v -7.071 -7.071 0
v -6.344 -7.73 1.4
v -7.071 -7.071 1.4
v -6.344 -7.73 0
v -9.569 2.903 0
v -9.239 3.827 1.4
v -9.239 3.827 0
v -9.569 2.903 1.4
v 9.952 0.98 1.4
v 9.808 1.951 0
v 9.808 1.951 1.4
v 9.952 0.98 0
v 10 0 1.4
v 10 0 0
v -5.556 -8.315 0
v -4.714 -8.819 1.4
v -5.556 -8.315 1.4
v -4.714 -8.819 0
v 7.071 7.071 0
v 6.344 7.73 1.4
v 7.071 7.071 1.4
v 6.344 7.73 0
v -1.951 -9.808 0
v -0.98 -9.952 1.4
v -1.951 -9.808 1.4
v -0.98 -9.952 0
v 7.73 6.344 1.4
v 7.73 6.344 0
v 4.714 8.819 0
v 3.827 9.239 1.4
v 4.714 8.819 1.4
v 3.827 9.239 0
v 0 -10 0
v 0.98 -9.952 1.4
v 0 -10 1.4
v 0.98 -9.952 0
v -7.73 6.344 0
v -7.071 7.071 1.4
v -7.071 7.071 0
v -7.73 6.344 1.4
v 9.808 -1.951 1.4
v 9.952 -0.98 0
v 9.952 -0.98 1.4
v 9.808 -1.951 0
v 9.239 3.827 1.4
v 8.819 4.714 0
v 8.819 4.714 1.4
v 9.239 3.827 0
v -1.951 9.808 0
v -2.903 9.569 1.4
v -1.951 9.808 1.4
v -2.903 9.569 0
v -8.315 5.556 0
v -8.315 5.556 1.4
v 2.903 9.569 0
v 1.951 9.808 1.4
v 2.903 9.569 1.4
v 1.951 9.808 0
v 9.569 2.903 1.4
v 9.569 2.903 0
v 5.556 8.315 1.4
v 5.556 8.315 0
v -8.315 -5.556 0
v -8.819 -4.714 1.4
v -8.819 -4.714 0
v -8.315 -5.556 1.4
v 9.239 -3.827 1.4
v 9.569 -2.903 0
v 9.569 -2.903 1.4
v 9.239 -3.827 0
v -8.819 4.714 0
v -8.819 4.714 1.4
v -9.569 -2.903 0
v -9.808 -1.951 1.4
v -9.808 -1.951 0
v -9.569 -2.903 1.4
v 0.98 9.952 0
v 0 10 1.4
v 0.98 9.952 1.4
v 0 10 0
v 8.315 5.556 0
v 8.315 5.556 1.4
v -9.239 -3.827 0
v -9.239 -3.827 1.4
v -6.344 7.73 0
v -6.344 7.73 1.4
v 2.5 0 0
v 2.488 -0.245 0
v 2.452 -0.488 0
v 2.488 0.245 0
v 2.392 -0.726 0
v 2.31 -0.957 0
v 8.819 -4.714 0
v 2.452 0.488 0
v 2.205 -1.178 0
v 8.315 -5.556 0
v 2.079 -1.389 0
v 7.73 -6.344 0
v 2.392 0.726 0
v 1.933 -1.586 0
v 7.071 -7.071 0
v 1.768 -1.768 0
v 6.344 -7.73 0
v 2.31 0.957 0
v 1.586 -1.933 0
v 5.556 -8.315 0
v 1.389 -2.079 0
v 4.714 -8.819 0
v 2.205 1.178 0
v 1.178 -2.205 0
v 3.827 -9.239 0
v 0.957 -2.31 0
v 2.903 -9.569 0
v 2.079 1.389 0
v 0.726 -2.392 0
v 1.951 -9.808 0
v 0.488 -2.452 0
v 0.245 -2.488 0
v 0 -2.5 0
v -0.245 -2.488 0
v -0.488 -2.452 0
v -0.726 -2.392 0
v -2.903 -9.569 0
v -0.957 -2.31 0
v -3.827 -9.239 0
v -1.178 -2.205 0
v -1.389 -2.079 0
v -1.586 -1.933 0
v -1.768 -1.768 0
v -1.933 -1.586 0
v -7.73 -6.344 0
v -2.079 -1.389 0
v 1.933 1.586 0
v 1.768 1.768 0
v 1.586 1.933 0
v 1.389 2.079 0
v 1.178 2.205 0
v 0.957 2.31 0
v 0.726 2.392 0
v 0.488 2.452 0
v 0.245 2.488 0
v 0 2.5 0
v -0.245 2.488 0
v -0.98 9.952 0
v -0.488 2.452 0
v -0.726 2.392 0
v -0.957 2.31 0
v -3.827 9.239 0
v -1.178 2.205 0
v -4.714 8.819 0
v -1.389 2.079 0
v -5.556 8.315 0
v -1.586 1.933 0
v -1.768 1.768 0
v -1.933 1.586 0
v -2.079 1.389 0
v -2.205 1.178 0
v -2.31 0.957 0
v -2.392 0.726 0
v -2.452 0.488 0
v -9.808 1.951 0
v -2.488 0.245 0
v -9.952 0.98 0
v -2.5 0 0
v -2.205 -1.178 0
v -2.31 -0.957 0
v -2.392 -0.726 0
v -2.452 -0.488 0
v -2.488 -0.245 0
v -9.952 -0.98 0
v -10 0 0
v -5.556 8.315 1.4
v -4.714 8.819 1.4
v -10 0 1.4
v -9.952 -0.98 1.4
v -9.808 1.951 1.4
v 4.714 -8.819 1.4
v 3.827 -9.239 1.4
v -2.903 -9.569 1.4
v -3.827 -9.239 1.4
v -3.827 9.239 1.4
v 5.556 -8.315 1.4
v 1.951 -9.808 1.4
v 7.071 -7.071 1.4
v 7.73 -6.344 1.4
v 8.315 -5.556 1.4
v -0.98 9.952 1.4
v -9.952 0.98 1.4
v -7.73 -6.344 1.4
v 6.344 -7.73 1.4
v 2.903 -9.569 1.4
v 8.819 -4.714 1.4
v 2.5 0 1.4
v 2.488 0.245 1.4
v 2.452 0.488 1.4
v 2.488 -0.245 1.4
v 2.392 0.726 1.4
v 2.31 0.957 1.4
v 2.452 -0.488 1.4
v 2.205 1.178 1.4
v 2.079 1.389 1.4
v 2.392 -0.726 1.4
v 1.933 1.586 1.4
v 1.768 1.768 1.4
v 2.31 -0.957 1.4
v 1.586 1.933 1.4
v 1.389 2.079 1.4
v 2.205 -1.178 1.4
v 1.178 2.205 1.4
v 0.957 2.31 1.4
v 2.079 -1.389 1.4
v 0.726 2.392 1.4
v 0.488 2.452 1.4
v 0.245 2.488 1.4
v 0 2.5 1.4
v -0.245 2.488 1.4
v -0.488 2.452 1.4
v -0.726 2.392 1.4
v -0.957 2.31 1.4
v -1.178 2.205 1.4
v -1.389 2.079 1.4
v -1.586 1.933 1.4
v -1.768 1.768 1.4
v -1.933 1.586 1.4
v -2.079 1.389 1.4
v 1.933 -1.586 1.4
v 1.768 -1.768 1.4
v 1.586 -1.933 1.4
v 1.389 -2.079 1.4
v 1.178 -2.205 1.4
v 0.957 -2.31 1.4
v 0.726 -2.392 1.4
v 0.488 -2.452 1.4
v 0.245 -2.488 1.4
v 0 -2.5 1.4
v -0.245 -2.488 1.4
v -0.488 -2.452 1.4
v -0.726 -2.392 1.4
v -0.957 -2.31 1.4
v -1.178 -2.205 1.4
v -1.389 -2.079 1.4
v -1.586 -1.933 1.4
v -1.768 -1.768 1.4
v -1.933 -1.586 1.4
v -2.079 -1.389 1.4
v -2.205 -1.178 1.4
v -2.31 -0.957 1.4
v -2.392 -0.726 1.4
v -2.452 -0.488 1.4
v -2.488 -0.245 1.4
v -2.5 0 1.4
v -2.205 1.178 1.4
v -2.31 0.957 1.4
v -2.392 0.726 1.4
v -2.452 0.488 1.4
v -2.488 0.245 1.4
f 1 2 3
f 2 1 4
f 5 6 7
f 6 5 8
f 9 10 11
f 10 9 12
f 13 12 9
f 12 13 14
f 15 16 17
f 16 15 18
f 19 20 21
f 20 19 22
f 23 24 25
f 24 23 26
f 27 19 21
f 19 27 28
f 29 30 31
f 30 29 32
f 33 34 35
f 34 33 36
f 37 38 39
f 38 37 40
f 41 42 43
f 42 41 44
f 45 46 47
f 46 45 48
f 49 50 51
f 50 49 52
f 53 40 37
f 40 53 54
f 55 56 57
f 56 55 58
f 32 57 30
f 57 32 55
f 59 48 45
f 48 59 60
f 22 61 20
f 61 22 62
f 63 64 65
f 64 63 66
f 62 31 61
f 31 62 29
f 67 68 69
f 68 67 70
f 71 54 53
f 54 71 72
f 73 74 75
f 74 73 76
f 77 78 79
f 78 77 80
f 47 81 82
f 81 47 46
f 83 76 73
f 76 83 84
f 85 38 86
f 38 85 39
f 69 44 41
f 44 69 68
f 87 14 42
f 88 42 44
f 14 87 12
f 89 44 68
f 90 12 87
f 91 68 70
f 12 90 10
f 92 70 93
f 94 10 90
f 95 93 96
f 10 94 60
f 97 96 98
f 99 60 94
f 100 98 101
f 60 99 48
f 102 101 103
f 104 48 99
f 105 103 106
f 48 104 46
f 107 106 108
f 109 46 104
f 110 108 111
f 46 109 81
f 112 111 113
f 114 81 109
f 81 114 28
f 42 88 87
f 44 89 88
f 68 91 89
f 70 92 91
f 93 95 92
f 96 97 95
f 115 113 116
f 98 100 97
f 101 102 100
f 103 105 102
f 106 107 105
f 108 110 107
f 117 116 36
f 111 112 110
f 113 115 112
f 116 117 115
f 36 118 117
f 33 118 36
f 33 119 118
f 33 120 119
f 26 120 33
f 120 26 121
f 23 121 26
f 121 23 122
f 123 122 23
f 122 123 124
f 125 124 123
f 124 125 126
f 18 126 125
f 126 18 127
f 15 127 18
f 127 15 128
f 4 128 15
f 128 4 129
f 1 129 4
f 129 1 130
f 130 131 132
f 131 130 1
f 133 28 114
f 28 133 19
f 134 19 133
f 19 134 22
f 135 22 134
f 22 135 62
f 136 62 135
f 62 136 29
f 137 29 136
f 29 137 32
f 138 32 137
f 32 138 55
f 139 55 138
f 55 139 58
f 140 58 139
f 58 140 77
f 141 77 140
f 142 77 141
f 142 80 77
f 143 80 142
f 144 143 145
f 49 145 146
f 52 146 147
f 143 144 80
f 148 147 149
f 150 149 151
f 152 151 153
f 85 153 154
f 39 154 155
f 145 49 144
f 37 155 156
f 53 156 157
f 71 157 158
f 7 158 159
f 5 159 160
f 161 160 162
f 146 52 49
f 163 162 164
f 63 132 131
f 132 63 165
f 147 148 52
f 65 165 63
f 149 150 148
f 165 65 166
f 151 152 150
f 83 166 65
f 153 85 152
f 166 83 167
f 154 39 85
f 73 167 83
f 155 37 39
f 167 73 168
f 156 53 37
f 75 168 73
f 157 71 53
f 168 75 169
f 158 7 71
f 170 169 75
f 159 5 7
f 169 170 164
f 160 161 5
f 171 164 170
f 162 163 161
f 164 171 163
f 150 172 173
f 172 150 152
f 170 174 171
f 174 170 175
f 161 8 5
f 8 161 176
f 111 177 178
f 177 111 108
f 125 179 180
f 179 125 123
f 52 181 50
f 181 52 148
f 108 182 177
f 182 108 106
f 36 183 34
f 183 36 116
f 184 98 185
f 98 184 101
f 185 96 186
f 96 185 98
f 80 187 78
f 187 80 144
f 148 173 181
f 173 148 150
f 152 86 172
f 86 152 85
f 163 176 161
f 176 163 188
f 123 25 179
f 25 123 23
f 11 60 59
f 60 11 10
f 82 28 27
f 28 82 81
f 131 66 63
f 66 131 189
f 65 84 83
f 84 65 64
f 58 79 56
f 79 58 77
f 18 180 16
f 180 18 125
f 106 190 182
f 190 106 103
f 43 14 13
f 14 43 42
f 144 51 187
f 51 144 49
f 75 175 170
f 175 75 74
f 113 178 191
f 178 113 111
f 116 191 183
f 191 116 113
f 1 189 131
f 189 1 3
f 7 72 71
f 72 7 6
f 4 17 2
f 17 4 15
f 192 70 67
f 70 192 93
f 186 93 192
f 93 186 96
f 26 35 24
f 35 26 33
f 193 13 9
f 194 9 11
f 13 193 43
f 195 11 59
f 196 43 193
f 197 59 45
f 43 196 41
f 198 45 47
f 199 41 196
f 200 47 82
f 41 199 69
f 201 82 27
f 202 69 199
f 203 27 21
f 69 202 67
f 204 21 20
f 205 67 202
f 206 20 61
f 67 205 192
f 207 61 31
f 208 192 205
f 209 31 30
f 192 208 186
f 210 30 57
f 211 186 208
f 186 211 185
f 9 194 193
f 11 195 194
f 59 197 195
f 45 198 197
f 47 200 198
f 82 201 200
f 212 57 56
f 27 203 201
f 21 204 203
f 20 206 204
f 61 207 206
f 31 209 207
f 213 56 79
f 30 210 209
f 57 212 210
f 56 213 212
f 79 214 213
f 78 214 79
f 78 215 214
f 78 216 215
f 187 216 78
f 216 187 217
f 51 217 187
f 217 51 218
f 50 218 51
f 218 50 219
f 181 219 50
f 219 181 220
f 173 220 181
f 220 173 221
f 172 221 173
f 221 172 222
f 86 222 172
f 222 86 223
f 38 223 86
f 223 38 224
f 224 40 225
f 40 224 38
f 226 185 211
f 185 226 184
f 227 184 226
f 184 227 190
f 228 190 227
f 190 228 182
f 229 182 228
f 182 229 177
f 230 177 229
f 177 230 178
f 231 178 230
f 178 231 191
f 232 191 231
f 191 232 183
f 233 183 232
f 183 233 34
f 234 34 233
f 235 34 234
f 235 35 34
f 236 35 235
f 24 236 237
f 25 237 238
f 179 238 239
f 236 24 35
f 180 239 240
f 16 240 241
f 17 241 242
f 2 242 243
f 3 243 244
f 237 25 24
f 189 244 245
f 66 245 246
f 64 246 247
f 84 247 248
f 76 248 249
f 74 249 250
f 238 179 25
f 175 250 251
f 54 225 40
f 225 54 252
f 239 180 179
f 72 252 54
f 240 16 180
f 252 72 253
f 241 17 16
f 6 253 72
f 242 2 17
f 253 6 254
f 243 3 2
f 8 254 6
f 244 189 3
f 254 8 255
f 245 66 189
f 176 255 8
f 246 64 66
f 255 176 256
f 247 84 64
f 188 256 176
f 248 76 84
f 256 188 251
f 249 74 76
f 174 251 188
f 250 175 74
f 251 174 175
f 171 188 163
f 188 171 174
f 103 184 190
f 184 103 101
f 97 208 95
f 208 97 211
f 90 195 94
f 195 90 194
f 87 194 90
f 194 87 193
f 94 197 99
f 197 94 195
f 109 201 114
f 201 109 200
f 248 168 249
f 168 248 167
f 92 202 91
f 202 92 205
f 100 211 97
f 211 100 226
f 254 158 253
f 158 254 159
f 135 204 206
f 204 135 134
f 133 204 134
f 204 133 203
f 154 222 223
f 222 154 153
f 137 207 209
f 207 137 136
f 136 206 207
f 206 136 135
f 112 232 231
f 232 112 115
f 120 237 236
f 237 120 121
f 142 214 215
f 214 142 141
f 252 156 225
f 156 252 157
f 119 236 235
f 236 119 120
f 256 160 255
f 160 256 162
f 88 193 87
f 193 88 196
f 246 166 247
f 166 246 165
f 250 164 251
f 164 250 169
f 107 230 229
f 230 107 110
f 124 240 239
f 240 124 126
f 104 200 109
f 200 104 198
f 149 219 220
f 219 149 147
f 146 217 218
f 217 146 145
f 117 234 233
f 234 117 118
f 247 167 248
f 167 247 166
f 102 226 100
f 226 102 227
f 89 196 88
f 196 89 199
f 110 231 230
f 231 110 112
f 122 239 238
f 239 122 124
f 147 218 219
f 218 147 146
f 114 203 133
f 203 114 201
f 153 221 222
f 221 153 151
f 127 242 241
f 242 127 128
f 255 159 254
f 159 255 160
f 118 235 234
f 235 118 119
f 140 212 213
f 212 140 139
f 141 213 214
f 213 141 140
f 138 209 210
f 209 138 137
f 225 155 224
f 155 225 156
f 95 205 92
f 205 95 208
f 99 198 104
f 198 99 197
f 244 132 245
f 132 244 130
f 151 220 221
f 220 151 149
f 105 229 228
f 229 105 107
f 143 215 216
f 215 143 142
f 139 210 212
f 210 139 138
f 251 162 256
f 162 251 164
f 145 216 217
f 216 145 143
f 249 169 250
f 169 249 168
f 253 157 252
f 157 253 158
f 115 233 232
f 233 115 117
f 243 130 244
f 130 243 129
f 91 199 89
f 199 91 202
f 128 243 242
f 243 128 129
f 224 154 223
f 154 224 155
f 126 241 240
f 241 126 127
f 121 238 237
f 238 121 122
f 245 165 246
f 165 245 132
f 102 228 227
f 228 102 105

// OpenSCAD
difference() {
    cylinder(h=1.4, d=20.0, $fn=64);
    translate([0, 0, -0.1])
        cylinder(h=1.6, d=5.0, $fn=64);
}
